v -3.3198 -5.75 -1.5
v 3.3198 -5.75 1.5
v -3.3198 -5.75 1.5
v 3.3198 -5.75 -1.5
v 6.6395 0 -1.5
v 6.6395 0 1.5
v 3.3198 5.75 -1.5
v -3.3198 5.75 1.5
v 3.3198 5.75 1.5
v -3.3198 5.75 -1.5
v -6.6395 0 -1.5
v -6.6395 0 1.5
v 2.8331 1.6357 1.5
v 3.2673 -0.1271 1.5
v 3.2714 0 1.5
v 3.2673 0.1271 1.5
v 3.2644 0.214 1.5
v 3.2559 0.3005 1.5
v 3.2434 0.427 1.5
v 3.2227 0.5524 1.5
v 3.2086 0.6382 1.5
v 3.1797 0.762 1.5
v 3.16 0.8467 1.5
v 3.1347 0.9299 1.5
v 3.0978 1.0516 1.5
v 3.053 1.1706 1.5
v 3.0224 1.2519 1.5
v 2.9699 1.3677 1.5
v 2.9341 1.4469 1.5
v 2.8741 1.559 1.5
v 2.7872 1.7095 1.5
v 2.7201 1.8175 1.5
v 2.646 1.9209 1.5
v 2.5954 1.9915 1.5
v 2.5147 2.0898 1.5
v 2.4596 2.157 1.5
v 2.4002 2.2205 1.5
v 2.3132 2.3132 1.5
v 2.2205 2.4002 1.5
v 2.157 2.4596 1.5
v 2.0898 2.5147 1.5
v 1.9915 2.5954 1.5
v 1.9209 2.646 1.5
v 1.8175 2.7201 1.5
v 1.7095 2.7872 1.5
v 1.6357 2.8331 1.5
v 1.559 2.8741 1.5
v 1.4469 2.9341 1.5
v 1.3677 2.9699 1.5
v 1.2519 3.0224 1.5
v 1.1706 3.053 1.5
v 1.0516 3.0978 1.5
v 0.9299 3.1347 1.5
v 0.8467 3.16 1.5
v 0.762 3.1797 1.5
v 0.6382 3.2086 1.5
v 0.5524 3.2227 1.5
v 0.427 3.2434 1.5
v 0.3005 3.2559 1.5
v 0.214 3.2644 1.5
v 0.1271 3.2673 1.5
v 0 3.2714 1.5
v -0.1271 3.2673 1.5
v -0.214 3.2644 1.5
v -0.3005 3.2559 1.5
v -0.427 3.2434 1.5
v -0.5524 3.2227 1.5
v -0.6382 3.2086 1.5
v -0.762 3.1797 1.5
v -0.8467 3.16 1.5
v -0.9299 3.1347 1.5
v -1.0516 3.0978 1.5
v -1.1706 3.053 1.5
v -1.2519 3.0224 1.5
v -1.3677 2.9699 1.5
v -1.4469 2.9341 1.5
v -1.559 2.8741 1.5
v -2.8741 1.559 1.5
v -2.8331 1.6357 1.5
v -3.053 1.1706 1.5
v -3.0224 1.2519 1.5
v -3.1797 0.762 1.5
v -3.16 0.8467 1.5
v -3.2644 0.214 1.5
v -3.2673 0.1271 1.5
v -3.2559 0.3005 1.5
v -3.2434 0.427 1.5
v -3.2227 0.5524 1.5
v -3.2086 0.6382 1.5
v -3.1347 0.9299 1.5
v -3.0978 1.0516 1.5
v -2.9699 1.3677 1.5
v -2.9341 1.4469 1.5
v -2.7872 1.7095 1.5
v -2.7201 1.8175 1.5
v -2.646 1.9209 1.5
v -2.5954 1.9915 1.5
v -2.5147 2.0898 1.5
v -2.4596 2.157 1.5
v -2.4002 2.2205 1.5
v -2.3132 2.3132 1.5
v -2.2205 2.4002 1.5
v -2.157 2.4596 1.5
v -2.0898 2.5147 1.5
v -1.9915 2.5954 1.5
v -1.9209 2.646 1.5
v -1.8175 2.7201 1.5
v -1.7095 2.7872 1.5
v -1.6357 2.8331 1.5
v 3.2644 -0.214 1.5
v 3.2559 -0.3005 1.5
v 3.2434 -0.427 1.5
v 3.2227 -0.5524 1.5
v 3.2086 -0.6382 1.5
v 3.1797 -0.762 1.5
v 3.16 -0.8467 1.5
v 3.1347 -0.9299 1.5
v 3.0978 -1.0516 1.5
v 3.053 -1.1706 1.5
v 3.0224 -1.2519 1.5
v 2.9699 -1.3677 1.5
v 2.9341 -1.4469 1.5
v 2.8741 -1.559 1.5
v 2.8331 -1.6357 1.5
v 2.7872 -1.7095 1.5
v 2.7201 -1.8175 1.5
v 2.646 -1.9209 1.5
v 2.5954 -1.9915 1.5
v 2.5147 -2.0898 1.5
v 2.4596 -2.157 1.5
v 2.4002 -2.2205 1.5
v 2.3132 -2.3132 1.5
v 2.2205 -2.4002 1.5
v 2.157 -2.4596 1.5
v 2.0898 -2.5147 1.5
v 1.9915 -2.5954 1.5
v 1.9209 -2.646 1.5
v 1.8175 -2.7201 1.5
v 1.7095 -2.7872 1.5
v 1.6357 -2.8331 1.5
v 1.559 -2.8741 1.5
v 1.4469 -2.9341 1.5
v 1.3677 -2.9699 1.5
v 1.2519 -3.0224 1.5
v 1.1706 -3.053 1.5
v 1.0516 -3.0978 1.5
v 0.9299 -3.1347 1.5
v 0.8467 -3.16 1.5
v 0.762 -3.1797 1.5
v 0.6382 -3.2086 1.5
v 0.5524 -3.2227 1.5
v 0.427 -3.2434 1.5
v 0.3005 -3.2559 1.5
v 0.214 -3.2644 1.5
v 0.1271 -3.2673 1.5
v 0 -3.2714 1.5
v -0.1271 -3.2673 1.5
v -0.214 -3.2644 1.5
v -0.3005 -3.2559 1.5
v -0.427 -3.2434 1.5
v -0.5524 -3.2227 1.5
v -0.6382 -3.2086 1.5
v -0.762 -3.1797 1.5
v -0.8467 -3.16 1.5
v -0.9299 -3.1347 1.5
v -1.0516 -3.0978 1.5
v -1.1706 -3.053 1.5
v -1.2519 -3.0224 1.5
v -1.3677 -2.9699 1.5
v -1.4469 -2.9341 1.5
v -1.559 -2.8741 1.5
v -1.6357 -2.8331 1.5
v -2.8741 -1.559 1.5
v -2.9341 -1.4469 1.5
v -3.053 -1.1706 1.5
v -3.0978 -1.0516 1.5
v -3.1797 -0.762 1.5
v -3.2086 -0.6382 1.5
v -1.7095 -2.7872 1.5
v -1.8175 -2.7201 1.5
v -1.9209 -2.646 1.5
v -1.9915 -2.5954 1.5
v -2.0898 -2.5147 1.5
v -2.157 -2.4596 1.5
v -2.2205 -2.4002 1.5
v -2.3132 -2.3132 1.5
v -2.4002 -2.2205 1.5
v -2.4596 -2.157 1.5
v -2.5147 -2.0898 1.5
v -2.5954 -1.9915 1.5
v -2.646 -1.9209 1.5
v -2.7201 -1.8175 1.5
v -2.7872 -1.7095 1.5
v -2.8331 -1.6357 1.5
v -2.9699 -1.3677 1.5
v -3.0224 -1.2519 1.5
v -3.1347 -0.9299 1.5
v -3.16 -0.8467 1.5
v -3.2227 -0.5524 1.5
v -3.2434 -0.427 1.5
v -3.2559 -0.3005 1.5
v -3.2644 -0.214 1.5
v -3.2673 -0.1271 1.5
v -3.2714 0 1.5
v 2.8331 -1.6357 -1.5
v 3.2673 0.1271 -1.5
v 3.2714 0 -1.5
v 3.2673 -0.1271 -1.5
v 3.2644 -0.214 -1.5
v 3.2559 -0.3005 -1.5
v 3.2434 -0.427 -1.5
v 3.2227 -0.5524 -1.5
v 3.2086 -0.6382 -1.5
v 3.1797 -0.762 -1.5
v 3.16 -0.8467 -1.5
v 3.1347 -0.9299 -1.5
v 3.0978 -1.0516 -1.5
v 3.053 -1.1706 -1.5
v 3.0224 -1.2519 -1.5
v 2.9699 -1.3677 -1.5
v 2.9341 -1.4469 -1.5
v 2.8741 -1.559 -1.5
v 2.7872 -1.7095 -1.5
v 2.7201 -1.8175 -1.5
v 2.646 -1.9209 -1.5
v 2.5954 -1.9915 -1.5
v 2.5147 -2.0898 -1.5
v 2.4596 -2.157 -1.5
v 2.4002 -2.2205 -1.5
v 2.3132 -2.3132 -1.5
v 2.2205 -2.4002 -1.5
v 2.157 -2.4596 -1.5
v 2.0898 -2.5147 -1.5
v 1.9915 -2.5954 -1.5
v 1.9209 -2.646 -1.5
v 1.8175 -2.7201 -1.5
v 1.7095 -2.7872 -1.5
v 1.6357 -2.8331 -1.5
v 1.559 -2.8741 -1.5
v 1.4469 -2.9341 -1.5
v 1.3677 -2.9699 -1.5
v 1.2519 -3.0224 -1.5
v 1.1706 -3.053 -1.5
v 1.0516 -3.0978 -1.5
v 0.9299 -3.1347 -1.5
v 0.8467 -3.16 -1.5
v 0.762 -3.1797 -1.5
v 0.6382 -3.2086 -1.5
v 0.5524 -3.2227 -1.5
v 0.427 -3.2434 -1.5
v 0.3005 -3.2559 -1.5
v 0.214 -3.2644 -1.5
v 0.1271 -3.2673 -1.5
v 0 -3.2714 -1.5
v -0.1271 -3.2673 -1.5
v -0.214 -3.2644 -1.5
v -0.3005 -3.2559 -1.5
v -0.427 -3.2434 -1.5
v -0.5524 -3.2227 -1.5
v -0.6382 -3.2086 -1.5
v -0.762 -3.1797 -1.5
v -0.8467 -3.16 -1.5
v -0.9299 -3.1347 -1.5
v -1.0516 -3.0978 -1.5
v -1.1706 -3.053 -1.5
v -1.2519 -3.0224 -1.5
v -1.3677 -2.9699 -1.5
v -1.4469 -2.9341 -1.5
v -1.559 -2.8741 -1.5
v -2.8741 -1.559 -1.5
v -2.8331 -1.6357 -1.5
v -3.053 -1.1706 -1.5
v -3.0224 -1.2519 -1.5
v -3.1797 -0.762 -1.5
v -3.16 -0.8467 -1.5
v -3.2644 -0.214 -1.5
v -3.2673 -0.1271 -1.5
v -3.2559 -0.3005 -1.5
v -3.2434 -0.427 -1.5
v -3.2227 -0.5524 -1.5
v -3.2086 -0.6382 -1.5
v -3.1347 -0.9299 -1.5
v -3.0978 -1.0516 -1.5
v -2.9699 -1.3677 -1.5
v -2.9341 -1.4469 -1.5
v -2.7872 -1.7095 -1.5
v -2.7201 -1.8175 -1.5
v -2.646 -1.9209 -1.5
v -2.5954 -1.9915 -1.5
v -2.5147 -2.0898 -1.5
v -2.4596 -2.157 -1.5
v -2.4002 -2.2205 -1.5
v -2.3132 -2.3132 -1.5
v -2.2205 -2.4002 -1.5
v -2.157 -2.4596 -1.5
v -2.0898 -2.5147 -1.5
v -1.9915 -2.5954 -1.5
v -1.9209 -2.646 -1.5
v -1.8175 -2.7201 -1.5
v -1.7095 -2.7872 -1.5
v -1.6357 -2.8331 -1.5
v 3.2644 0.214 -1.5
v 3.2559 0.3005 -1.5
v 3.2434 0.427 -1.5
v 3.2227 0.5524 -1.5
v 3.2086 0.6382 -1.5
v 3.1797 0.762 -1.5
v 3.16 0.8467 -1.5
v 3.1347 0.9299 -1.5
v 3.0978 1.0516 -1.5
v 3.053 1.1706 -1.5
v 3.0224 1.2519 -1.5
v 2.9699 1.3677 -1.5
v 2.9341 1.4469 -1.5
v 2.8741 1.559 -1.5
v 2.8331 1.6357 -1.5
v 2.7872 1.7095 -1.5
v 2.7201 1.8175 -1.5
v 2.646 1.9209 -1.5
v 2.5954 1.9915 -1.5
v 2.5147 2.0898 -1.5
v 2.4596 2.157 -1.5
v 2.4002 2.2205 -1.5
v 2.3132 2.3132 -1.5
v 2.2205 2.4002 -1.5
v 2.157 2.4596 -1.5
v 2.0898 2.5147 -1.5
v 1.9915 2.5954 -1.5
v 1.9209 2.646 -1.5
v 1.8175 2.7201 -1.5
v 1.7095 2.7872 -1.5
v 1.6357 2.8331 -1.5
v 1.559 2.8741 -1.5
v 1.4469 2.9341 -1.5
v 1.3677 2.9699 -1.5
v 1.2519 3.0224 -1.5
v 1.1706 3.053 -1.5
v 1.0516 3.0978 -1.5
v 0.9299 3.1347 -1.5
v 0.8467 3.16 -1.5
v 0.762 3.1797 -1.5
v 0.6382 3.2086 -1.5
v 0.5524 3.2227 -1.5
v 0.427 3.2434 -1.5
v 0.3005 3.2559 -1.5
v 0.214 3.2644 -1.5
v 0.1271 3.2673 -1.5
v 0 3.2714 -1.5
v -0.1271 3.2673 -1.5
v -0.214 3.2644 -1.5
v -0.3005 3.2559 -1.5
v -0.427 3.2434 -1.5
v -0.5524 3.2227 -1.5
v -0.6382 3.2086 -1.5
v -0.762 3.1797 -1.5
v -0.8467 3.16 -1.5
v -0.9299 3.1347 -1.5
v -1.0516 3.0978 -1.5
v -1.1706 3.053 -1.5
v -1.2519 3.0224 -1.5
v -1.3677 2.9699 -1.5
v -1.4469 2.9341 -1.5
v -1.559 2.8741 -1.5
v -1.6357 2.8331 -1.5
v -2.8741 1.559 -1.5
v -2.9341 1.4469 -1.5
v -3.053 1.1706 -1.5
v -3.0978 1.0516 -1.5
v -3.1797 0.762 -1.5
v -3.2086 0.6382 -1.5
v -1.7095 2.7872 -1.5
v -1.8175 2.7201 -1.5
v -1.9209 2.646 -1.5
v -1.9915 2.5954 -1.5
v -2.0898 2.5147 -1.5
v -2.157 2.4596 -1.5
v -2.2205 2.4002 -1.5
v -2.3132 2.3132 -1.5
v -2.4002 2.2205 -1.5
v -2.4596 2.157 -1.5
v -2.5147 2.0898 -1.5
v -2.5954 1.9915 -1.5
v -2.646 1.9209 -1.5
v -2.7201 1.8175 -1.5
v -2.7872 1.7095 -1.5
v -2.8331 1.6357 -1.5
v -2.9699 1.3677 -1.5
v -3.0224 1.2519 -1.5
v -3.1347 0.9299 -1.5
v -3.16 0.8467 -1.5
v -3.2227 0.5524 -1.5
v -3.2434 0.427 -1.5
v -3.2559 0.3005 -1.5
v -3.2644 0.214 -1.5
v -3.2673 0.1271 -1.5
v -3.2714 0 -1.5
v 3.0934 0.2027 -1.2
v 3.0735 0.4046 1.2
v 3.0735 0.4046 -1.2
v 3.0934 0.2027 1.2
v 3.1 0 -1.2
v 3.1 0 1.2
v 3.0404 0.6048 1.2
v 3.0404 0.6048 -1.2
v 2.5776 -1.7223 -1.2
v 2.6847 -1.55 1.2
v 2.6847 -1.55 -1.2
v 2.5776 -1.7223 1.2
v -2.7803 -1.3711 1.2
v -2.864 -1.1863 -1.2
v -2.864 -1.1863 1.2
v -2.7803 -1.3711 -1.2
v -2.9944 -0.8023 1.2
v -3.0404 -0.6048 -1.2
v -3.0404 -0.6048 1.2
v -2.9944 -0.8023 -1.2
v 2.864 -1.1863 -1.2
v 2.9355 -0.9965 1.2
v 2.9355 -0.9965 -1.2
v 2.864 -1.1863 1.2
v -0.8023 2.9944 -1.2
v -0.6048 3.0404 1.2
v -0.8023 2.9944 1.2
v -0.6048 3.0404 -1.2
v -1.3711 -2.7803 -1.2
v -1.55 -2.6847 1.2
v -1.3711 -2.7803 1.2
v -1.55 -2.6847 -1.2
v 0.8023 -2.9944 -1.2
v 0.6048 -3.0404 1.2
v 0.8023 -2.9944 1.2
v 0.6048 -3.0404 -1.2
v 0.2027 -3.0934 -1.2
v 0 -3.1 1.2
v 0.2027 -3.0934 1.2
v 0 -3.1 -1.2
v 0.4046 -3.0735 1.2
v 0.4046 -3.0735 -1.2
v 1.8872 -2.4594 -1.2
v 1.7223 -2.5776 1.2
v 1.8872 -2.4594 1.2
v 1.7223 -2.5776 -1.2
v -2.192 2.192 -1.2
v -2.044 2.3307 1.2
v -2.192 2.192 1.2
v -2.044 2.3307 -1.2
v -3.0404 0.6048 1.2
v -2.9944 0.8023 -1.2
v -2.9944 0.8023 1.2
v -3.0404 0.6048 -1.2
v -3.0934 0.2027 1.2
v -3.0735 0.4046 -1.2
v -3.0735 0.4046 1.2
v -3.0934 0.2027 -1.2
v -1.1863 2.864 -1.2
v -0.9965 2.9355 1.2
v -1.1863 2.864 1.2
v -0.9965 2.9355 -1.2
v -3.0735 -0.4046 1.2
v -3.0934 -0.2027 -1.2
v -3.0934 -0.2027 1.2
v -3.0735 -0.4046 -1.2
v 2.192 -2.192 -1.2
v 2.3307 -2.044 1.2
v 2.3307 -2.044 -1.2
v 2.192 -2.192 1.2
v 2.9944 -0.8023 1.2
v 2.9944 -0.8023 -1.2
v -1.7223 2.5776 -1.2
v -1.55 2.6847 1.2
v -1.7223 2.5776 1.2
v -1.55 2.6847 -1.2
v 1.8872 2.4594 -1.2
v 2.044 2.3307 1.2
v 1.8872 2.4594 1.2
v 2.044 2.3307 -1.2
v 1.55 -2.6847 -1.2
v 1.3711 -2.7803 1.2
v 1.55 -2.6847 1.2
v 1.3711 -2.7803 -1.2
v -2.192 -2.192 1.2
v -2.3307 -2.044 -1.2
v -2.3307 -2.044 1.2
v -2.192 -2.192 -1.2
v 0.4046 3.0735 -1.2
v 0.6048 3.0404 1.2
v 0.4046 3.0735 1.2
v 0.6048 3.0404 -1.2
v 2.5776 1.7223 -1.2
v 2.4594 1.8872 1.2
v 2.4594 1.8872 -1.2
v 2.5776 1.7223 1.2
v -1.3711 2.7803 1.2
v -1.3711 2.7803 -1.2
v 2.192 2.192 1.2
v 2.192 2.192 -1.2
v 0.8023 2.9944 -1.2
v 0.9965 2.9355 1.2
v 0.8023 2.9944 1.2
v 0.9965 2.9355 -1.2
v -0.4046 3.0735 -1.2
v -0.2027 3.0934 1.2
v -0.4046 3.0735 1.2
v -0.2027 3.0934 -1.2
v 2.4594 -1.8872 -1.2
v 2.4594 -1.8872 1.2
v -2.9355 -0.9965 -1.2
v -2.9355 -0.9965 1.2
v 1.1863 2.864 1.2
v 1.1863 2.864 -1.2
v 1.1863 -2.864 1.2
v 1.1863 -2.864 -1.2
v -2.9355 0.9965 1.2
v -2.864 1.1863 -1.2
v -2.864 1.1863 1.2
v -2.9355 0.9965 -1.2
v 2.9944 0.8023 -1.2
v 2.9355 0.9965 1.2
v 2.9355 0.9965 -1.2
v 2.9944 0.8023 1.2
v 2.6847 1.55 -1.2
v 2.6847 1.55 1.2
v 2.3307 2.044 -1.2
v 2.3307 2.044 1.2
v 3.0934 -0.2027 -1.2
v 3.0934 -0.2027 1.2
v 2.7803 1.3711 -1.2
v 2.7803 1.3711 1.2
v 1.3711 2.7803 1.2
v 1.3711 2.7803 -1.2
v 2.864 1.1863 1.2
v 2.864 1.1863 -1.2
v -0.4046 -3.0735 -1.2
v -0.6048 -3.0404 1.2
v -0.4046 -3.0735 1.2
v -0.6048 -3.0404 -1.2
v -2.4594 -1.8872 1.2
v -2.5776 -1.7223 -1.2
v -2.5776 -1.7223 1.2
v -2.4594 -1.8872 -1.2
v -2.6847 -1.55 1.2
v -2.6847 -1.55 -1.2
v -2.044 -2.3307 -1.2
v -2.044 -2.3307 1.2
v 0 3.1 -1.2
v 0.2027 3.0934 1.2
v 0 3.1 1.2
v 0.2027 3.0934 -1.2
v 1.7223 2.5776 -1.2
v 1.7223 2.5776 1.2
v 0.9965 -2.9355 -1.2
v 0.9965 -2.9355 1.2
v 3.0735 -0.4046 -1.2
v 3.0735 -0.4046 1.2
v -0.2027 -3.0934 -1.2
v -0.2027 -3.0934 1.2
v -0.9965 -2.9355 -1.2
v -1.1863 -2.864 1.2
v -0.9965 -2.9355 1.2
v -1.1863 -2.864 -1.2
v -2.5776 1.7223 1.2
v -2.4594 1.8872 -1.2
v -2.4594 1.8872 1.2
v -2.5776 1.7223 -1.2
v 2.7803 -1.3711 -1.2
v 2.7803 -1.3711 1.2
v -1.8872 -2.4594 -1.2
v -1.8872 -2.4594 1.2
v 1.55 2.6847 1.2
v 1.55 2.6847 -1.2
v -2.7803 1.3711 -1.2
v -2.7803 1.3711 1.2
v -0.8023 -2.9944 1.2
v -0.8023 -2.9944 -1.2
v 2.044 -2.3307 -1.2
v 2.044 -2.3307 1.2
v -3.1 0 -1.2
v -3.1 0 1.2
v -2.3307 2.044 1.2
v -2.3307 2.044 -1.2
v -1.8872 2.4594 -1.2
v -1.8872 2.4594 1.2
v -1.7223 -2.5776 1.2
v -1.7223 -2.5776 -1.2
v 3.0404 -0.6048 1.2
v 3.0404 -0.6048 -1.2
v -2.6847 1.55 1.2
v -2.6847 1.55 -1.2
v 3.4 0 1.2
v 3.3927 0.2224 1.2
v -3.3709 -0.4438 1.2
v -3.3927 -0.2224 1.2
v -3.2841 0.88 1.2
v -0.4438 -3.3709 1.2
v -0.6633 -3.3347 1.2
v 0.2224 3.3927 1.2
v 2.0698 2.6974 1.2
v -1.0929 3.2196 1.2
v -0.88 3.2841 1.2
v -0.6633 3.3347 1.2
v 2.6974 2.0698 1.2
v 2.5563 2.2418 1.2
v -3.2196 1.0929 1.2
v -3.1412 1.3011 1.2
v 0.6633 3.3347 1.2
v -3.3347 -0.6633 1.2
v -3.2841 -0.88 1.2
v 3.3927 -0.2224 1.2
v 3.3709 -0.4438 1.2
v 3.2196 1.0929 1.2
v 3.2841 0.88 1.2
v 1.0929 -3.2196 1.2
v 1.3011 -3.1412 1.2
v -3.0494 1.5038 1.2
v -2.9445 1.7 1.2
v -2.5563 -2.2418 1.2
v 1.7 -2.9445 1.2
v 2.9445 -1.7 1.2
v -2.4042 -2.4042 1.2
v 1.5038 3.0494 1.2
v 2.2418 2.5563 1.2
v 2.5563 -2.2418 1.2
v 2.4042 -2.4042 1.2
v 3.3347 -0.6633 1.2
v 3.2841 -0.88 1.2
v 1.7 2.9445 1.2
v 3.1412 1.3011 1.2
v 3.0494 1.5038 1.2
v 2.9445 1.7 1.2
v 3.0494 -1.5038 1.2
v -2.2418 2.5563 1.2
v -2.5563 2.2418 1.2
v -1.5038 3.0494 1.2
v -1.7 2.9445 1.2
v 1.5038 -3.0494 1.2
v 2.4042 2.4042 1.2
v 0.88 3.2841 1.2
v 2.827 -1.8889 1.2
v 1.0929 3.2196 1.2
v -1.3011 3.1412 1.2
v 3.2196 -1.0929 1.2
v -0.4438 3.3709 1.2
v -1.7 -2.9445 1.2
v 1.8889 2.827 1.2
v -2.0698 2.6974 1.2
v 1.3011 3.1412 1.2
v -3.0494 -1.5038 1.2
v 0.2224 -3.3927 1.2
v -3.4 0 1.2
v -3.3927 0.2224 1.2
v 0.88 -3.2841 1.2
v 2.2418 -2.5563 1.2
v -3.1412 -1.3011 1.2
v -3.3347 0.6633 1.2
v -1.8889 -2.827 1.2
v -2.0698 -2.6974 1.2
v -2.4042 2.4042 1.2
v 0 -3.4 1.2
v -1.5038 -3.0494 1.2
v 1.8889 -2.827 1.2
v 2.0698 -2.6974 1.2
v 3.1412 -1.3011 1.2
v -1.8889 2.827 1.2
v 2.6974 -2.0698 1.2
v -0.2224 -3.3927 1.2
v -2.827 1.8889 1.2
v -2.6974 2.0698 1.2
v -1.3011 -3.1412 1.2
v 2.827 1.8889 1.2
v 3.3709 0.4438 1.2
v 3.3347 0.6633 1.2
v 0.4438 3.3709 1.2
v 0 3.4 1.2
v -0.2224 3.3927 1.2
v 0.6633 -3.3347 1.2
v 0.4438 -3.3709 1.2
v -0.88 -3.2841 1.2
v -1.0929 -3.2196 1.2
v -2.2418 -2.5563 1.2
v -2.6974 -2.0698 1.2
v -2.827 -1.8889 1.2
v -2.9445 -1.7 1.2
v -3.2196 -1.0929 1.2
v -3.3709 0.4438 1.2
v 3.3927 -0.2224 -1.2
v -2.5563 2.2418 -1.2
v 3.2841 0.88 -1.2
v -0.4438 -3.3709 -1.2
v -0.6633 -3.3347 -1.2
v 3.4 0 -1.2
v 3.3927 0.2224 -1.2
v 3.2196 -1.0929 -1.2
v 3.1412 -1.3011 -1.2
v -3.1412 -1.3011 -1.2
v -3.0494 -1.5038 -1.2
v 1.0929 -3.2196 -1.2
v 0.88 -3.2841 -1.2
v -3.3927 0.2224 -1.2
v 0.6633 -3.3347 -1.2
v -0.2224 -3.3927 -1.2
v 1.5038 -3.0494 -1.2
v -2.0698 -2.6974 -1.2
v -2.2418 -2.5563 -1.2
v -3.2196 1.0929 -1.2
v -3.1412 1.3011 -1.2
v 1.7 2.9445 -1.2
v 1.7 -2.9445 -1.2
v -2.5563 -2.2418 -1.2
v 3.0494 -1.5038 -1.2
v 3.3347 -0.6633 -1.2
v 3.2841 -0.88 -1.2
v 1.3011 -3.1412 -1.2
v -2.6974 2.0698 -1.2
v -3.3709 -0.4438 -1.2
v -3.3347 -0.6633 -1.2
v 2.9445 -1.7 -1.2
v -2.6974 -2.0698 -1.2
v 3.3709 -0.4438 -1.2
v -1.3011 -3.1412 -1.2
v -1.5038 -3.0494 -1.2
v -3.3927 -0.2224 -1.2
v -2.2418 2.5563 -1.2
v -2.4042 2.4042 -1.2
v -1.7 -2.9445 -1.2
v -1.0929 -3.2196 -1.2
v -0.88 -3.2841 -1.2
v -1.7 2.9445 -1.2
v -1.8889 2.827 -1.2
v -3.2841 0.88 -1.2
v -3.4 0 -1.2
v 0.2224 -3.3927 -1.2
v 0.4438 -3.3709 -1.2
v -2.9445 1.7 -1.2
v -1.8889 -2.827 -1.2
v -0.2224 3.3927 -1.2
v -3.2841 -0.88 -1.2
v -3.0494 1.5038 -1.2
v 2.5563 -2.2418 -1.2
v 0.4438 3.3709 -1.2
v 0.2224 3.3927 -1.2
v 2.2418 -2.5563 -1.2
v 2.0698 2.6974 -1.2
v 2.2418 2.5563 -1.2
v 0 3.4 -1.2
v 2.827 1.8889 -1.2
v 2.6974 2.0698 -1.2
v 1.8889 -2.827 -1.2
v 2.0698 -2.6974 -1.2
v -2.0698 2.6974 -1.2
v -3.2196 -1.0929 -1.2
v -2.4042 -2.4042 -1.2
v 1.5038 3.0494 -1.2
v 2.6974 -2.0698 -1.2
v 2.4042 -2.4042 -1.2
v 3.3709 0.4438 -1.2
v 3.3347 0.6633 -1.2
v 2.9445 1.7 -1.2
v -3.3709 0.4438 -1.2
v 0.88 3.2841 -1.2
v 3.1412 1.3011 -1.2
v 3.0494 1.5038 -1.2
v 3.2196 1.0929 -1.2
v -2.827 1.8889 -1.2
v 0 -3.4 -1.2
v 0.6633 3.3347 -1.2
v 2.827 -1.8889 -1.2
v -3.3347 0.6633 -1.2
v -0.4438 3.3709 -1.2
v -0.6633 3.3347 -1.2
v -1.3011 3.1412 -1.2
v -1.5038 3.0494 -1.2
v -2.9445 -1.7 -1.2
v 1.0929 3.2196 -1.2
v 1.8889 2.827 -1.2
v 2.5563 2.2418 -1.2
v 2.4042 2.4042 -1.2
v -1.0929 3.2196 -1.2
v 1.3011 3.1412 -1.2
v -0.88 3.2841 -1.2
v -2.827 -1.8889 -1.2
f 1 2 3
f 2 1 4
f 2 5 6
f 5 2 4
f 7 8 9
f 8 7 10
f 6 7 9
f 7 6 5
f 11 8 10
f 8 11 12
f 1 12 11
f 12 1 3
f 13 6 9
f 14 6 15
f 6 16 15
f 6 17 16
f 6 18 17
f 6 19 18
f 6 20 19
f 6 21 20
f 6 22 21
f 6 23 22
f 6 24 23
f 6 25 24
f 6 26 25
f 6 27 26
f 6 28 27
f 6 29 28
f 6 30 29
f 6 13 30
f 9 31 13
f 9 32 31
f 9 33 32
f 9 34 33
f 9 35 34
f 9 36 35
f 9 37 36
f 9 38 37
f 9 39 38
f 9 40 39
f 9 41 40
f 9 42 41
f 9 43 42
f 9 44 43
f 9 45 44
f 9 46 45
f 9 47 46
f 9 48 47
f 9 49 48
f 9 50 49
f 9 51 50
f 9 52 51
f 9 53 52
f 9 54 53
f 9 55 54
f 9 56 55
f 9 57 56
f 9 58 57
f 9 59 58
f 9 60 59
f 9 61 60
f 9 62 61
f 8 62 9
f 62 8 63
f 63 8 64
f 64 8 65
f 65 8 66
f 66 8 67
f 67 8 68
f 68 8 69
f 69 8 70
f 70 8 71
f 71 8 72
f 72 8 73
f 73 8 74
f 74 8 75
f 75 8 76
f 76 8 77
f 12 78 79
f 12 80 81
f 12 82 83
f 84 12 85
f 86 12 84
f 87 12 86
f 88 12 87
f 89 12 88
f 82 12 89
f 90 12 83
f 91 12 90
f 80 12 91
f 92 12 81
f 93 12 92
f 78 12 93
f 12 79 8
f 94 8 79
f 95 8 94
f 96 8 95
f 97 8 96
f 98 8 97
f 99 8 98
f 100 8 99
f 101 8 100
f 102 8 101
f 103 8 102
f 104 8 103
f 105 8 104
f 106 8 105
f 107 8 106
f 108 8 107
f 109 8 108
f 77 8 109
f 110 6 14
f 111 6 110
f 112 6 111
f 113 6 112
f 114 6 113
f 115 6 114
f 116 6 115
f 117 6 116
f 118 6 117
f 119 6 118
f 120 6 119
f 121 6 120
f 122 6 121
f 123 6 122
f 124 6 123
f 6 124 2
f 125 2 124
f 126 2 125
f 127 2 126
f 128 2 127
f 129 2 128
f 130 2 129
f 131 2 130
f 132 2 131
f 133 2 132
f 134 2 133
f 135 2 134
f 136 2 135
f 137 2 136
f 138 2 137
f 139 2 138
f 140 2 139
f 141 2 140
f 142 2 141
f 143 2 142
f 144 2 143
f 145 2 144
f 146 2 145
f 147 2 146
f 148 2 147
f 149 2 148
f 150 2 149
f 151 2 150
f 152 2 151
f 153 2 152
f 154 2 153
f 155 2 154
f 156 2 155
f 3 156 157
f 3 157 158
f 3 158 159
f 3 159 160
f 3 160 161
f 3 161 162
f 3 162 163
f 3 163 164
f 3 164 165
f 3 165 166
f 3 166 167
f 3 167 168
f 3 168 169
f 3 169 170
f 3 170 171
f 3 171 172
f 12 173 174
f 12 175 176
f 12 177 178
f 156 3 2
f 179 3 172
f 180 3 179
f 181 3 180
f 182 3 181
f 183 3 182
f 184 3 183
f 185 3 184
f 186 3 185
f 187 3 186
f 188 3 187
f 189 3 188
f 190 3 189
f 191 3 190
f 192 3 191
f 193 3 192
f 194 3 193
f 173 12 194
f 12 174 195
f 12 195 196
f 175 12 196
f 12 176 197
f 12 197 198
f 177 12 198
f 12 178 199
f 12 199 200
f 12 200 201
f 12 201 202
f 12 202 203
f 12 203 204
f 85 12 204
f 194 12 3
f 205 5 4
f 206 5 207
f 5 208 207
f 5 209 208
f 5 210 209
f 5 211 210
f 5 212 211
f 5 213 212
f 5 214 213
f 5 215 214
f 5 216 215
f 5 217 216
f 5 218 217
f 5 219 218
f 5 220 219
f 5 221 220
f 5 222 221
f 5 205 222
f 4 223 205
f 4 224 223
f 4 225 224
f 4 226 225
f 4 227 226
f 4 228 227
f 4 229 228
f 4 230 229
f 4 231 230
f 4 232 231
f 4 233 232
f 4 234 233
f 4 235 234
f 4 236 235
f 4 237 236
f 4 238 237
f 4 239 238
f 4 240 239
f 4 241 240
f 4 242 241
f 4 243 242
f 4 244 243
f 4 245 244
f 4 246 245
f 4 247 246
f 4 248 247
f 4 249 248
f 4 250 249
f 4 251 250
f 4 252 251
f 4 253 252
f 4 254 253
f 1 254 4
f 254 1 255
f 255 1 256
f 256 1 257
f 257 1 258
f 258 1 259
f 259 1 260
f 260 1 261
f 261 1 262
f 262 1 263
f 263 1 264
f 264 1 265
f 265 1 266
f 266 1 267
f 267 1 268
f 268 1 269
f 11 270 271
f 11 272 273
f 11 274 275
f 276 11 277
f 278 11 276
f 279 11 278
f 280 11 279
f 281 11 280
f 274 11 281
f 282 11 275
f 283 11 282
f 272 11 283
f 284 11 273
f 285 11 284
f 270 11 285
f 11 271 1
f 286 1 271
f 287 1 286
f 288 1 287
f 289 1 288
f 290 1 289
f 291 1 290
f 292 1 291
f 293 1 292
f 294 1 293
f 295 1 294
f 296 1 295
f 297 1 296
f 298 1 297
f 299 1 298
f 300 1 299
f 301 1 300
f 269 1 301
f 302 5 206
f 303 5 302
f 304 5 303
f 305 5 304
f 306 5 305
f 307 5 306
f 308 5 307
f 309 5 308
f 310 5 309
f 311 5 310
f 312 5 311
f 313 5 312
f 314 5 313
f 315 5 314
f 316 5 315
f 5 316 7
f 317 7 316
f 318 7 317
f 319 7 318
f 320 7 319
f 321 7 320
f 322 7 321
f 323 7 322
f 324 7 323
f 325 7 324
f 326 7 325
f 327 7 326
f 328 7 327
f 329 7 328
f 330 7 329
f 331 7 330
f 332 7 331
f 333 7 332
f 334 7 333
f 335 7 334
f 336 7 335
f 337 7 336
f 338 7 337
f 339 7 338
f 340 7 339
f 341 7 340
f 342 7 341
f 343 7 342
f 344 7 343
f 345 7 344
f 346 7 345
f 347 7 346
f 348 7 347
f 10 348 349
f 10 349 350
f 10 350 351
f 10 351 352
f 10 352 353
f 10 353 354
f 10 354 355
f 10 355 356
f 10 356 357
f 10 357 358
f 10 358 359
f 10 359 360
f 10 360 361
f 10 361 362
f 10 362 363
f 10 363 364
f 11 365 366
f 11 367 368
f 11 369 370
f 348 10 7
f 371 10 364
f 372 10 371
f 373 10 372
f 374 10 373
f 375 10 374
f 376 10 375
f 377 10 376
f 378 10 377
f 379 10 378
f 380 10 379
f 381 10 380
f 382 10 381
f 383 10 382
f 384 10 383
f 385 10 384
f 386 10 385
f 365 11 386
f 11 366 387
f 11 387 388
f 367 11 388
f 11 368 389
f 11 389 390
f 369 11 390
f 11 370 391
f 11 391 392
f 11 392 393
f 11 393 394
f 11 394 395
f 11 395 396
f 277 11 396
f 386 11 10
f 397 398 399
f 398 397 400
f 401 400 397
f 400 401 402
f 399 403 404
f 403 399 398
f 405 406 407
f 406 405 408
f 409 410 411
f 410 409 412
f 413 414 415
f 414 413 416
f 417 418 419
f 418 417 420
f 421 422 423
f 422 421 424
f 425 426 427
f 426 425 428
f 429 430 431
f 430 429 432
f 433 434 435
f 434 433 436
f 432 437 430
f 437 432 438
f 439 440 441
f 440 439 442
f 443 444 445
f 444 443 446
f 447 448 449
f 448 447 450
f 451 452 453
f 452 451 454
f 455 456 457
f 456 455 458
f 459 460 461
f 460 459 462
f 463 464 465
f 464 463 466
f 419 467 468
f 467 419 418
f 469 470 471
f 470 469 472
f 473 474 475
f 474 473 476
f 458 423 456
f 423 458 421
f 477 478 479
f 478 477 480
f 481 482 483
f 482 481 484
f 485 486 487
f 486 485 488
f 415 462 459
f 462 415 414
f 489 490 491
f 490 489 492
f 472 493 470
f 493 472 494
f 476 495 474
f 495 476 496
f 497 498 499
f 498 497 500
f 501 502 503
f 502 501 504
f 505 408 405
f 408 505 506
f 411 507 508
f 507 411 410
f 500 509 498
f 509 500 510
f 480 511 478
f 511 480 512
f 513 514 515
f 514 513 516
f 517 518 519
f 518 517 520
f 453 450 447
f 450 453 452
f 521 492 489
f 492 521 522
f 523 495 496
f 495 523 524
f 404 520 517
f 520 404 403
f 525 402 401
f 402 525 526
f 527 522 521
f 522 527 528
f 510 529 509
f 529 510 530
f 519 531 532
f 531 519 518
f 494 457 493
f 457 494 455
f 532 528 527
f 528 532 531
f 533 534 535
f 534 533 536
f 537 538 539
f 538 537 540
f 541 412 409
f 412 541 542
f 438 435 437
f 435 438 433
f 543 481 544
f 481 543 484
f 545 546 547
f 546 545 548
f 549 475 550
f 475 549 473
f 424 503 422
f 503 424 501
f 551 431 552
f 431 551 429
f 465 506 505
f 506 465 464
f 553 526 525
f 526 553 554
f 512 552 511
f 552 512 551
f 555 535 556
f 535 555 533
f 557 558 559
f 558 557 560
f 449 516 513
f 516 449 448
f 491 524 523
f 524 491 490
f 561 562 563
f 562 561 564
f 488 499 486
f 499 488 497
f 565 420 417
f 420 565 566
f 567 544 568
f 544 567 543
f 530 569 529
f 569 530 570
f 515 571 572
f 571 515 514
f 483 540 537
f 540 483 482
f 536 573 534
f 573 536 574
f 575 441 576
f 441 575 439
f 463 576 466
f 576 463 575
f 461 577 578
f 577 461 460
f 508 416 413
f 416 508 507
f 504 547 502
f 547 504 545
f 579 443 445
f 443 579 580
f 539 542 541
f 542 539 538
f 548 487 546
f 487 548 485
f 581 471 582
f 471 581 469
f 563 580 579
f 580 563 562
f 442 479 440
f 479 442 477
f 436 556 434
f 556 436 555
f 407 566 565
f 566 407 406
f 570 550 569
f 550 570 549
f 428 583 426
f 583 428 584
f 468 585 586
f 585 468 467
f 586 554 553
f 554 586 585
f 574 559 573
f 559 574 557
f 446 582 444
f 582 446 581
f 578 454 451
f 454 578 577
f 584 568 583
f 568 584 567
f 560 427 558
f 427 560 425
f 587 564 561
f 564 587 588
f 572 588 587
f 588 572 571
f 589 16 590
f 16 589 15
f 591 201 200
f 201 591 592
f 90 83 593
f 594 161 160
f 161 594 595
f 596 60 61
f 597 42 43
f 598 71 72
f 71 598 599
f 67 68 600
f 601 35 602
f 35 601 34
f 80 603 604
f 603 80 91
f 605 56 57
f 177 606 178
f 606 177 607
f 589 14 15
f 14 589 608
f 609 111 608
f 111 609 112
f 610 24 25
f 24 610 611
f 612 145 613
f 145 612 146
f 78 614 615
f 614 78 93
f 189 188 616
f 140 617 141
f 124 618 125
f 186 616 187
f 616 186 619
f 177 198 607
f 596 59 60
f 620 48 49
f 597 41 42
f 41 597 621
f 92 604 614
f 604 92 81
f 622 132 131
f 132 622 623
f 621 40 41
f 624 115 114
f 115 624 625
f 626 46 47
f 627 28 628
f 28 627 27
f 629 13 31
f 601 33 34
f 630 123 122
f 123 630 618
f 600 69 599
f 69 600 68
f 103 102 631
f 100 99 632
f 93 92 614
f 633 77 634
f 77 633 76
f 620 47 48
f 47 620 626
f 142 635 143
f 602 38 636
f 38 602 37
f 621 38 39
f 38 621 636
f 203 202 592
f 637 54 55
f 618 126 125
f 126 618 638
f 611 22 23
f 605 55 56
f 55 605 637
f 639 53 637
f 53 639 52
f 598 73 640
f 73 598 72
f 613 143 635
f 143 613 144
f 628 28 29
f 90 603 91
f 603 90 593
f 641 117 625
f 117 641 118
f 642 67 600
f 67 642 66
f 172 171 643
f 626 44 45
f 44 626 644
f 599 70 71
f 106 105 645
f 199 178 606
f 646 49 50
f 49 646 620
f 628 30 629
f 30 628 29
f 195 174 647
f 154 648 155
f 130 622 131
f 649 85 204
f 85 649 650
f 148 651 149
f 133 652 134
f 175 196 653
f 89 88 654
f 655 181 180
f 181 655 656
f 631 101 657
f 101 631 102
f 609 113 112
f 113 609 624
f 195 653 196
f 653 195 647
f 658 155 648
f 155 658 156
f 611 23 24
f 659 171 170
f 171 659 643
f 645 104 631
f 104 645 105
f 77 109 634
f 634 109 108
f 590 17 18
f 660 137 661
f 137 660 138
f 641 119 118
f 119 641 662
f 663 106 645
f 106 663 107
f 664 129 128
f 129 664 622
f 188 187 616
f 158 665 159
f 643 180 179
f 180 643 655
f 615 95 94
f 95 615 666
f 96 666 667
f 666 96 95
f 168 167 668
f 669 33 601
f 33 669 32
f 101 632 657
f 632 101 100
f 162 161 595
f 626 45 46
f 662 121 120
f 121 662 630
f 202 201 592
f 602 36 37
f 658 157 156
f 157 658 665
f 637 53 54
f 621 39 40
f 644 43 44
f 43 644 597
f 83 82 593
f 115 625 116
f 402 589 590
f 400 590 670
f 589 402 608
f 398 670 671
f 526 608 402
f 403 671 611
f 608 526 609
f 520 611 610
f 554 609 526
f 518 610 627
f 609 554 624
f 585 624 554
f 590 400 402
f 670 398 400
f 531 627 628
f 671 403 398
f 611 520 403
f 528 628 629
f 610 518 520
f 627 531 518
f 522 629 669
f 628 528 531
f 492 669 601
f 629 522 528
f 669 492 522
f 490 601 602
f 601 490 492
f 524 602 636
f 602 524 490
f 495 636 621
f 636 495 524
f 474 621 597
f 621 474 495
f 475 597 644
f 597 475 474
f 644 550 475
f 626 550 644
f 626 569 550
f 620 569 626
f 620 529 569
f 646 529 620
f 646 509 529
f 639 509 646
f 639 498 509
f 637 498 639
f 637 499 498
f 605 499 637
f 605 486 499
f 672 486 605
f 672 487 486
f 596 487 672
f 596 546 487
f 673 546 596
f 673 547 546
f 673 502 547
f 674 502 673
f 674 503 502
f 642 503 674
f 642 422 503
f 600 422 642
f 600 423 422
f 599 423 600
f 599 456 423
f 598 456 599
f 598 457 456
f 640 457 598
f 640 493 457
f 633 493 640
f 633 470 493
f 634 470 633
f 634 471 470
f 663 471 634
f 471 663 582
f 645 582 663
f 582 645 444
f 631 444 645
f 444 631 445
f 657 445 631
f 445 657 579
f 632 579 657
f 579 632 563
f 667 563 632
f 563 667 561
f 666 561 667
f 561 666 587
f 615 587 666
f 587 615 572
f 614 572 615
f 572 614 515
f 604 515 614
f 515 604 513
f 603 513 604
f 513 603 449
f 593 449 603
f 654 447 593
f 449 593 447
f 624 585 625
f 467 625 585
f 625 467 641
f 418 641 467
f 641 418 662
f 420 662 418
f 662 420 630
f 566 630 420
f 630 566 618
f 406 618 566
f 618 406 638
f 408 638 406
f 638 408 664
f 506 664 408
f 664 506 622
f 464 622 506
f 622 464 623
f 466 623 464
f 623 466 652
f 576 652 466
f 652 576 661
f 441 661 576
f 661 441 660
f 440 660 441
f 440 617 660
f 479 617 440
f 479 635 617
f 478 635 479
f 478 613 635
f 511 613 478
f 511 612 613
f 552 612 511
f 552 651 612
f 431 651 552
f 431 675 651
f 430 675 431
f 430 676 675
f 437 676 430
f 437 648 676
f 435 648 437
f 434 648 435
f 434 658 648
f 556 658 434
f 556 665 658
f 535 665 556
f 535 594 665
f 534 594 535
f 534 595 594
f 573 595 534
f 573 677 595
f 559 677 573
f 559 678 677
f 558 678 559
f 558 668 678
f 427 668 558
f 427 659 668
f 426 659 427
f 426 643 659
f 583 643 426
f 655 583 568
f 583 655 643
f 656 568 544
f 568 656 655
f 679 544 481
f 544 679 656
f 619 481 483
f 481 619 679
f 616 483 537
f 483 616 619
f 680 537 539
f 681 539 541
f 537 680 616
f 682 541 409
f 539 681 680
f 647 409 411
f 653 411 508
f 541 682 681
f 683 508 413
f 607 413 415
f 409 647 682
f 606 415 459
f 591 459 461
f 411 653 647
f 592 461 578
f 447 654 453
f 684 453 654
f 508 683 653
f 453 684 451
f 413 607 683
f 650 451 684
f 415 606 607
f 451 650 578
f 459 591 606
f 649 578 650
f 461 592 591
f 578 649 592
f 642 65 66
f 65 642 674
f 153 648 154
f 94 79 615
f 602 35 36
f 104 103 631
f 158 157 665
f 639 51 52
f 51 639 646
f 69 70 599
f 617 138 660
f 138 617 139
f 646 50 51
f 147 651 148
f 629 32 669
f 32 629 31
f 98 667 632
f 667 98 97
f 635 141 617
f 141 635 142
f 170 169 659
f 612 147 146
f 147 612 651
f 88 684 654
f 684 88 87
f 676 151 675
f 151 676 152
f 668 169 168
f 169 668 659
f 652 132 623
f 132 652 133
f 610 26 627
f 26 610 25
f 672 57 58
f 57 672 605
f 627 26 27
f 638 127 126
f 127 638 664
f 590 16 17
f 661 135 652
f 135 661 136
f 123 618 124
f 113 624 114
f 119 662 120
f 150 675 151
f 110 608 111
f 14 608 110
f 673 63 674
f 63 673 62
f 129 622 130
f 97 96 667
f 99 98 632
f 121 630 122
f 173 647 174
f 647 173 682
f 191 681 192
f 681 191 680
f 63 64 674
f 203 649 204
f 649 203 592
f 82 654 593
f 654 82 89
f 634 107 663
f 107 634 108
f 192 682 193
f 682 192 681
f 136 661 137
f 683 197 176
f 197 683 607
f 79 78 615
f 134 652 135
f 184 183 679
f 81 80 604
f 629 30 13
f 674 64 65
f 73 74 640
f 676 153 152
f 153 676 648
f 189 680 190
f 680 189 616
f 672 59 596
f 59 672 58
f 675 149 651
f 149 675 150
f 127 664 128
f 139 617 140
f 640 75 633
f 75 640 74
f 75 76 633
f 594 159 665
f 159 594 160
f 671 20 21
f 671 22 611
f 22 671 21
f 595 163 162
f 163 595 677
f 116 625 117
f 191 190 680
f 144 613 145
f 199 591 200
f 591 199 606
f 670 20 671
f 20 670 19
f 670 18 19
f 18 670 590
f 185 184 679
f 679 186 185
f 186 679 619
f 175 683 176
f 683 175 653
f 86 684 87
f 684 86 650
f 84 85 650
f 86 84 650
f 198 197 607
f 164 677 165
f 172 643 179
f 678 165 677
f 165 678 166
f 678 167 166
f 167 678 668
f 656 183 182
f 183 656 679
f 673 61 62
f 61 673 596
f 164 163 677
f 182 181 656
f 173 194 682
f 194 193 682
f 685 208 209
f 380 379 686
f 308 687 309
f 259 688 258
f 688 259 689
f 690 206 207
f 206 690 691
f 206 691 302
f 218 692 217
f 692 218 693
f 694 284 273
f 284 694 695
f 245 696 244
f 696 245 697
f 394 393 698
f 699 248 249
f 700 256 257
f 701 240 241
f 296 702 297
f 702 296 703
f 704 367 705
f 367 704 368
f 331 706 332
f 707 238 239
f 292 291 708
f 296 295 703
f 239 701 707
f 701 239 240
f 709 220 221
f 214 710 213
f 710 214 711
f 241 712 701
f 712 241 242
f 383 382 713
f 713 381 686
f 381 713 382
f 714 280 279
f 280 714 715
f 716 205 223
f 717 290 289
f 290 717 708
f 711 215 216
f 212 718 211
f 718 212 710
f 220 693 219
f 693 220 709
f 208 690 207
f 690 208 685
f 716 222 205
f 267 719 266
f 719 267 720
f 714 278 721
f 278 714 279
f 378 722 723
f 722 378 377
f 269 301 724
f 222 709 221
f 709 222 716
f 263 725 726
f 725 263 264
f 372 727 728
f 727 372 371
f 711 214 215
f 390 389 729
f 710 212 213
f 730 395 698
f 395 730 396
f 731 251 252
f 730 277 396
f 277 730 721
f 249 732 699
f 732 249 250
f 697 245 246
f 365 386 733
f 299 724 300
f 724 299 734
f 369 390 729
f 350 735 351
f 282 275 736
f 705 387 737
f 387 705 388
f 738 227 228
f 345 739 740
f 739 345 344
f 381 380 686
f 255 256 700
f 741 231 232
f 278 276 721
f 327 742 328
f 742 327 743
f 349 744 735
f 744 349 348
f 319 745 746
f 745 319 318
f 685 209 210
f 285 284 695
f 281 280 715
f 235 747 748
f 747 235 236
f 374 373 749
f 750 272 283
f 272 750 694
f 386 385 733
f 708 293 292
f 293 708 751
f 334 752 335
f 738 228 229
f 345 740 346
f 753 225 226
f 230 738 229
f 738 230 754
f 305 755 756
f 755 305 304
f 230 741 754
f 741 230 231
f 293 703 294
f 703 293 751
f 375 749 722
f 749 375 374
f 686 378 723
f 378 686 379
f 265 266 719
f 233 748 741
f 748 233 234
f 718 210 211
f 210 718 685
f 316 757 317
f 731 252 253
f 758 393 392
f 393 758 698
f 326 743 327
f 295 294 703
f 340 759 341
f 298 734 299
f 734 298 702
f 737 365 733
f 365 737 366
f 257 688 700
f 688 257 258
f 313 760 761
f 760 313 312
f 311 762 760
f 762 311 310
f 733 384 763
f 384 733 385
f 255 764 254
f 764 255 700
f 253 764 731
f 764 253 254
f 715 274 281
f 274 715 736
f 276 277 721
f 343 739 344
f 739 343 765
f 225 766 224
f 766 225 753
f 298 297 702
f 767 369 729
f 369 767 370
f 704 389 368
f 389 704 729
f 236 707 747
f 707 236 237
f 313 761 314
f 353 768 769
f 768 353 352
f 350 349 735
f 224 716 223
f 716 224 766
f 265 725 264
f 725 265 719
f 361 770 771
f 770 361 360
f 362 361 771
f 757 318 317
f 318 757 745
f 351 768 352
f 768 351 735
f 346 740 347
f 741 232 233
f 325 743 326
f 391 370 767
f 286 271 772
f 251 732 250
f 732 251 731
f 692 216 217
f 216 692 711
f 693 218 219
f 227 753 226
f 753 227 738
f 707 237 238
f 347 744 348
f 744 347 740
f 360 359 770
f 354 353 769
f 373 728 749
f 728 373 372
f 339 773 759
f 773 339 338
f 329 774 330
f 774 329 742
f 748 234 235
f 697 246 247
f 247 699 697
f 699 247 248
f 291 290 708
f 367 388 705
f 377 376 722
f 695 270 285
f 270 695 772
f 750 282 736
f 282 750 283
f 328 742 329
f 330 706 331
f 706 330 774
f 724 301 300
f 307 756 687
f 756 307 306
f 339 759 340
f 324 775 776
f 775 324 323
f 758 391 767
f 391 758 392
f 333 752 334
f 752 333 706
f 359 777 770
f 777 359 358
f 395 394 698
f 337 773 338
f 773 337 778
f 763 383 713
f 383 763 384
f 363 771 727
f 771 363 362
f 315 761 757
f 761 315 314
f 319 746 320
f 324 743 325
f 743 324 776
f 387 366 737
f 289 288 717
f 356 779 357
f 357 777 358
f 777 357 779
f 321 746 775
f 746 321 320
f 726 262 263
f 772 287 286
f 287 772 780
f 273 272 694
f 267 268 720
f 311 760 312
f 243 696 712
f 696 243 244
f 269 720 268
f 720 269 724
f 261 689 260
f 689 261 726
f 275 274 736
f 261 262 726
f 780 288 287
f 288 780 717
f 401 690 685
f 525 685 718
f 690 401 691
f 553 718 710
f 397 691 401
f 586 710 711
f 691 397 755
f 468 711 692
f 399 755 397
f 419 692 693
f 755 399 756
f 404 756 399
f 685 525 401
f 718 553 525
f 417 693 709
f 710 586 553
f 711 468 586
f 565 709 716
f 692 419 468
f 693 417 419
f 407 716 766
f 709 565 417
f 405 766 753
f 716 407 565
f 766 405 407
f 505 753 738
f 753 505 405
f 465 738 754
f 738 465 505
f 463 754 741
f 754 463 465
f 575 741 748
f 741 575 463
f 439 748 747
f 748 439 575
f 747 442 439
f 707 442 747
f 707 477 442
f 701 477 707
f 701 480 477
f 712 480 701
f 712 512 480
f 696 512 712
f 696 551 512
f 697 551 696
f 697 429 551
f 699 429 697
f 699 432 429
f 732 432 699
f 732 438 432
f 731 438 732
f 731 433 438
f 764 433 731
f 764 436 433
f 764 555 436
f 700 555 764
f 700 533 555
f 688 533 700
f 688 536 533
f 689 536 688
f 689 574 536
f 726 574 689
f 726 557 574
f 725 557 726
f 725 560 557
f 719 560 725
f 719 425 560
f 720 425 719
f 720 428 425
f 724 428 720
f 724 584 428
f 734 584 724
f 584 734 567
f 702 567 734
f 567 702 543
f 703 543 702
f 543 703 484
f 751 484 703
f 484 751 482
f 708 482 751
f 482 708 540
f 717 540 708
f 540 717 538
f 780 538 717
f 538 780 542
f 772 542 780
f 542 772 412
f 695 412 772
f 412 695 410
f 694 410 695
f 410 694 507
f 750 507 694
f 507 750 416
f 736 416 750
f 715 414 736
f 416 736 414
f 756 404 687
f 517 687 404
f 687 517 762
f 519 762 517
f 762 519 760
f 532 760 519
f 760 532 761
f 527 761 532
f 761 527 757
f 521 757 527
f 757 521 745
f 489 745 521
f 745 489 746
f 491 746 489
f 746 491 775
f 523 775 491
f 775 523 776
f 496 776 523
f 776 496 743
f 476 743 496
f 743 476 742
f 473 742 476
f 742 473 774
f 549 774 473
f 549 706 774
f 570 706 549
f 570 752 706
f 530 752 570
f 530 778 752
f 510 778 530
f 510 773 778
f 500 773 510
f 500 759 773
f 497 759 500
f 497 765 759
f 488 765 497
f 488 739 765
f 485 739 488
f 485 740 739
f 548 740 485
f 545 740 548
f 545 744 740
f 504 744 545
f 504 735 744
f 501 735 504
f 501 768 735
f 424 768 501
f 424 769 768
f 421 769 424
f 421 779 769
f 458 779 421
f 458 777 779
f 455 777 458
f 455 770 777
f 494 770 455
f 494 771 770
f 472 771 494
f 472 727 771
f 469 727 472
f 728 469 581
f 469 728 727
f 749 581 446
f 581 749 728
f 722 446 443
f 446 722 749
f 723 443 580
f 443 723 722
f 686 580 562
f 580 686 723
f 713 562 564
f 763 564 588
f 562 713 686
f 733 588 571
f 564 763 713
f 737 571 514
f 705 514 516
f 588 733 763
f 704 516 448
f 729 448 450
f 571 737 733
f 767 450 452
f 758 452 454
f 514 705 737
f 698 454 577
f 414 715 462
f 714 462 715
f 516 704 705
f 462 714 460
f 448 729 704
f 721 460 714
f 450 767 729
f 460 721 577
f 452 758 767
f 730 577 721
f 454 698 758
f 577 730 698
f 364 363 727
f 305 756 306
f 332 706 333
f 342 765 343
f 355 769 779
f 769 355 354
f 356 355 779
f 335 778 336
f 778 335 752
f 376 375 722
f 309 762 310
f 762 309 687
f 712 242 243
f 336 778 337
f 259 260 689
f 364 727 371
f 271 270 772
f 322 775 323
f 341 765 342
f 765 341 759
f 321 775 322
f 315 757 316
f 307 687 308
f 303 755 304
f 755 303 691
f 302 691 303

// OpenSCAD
// Hex nut for M6 (6.0mm screw), 11.5mm across flats, 3.0mm thick

$fn = 96;

// Target dimensions
across_flats   = 11.5;   // mm
thickness      = 3.0;    // mm

// Hole (choose one): clearance or tap-drill representation
hole_diameter  = 6.2;    // mm (typical M6 clearance)
 //hole_diameter = 5.0;  // mm (typical M6 tap drill representation)

// Edge details
chamfer_size   = 0.3;    // mm lead-in on both faces
overlap        = 0.2;    // mm boolean overlap to avoid coplanar artifacts

// Derived: circumradius of hex from across-flats (AF = 2*apothem, R = apothem / cos(30))
hex_R = (across_flats/2) / cos(30);

module hex_prism(R, h) {
    cylinder(r=R, h=h, center=true, $fn=6);
}

module hex_nut(af, h, d_hole, chamfer) {
    R = (af/2) / cos(30);

    difference() {
        // Body
        hex_prism(R, h);

        // Circular through-hole (high $fn for round appearance)
        cylinder(d=d_hole, h=h + 2*overlap, center=true, $fn=$fn);

        // Lead-in chamfers (top and bottom), computed from thickness
        translate([0, 0,  h/2 - chamfer/2 + overlap])
            cylinder(h=chamfer + 2*overlap, r1=d_hole/2 + chamfer, r2=d_hole/2, center=true, $fn=$fn);

        translate([0, 0, -h/2 + chamfer/2 - overlap])
            cylinder(h=chamfer + 2*overlap, r1=d_hole/2, r2=d_hole/2 + chamfer, center=true, $fn=$fn);
    }
}

// Render
color("DimGray")
hex_nut(across_flats, thickness, hole_diameter, chamfer_size);
